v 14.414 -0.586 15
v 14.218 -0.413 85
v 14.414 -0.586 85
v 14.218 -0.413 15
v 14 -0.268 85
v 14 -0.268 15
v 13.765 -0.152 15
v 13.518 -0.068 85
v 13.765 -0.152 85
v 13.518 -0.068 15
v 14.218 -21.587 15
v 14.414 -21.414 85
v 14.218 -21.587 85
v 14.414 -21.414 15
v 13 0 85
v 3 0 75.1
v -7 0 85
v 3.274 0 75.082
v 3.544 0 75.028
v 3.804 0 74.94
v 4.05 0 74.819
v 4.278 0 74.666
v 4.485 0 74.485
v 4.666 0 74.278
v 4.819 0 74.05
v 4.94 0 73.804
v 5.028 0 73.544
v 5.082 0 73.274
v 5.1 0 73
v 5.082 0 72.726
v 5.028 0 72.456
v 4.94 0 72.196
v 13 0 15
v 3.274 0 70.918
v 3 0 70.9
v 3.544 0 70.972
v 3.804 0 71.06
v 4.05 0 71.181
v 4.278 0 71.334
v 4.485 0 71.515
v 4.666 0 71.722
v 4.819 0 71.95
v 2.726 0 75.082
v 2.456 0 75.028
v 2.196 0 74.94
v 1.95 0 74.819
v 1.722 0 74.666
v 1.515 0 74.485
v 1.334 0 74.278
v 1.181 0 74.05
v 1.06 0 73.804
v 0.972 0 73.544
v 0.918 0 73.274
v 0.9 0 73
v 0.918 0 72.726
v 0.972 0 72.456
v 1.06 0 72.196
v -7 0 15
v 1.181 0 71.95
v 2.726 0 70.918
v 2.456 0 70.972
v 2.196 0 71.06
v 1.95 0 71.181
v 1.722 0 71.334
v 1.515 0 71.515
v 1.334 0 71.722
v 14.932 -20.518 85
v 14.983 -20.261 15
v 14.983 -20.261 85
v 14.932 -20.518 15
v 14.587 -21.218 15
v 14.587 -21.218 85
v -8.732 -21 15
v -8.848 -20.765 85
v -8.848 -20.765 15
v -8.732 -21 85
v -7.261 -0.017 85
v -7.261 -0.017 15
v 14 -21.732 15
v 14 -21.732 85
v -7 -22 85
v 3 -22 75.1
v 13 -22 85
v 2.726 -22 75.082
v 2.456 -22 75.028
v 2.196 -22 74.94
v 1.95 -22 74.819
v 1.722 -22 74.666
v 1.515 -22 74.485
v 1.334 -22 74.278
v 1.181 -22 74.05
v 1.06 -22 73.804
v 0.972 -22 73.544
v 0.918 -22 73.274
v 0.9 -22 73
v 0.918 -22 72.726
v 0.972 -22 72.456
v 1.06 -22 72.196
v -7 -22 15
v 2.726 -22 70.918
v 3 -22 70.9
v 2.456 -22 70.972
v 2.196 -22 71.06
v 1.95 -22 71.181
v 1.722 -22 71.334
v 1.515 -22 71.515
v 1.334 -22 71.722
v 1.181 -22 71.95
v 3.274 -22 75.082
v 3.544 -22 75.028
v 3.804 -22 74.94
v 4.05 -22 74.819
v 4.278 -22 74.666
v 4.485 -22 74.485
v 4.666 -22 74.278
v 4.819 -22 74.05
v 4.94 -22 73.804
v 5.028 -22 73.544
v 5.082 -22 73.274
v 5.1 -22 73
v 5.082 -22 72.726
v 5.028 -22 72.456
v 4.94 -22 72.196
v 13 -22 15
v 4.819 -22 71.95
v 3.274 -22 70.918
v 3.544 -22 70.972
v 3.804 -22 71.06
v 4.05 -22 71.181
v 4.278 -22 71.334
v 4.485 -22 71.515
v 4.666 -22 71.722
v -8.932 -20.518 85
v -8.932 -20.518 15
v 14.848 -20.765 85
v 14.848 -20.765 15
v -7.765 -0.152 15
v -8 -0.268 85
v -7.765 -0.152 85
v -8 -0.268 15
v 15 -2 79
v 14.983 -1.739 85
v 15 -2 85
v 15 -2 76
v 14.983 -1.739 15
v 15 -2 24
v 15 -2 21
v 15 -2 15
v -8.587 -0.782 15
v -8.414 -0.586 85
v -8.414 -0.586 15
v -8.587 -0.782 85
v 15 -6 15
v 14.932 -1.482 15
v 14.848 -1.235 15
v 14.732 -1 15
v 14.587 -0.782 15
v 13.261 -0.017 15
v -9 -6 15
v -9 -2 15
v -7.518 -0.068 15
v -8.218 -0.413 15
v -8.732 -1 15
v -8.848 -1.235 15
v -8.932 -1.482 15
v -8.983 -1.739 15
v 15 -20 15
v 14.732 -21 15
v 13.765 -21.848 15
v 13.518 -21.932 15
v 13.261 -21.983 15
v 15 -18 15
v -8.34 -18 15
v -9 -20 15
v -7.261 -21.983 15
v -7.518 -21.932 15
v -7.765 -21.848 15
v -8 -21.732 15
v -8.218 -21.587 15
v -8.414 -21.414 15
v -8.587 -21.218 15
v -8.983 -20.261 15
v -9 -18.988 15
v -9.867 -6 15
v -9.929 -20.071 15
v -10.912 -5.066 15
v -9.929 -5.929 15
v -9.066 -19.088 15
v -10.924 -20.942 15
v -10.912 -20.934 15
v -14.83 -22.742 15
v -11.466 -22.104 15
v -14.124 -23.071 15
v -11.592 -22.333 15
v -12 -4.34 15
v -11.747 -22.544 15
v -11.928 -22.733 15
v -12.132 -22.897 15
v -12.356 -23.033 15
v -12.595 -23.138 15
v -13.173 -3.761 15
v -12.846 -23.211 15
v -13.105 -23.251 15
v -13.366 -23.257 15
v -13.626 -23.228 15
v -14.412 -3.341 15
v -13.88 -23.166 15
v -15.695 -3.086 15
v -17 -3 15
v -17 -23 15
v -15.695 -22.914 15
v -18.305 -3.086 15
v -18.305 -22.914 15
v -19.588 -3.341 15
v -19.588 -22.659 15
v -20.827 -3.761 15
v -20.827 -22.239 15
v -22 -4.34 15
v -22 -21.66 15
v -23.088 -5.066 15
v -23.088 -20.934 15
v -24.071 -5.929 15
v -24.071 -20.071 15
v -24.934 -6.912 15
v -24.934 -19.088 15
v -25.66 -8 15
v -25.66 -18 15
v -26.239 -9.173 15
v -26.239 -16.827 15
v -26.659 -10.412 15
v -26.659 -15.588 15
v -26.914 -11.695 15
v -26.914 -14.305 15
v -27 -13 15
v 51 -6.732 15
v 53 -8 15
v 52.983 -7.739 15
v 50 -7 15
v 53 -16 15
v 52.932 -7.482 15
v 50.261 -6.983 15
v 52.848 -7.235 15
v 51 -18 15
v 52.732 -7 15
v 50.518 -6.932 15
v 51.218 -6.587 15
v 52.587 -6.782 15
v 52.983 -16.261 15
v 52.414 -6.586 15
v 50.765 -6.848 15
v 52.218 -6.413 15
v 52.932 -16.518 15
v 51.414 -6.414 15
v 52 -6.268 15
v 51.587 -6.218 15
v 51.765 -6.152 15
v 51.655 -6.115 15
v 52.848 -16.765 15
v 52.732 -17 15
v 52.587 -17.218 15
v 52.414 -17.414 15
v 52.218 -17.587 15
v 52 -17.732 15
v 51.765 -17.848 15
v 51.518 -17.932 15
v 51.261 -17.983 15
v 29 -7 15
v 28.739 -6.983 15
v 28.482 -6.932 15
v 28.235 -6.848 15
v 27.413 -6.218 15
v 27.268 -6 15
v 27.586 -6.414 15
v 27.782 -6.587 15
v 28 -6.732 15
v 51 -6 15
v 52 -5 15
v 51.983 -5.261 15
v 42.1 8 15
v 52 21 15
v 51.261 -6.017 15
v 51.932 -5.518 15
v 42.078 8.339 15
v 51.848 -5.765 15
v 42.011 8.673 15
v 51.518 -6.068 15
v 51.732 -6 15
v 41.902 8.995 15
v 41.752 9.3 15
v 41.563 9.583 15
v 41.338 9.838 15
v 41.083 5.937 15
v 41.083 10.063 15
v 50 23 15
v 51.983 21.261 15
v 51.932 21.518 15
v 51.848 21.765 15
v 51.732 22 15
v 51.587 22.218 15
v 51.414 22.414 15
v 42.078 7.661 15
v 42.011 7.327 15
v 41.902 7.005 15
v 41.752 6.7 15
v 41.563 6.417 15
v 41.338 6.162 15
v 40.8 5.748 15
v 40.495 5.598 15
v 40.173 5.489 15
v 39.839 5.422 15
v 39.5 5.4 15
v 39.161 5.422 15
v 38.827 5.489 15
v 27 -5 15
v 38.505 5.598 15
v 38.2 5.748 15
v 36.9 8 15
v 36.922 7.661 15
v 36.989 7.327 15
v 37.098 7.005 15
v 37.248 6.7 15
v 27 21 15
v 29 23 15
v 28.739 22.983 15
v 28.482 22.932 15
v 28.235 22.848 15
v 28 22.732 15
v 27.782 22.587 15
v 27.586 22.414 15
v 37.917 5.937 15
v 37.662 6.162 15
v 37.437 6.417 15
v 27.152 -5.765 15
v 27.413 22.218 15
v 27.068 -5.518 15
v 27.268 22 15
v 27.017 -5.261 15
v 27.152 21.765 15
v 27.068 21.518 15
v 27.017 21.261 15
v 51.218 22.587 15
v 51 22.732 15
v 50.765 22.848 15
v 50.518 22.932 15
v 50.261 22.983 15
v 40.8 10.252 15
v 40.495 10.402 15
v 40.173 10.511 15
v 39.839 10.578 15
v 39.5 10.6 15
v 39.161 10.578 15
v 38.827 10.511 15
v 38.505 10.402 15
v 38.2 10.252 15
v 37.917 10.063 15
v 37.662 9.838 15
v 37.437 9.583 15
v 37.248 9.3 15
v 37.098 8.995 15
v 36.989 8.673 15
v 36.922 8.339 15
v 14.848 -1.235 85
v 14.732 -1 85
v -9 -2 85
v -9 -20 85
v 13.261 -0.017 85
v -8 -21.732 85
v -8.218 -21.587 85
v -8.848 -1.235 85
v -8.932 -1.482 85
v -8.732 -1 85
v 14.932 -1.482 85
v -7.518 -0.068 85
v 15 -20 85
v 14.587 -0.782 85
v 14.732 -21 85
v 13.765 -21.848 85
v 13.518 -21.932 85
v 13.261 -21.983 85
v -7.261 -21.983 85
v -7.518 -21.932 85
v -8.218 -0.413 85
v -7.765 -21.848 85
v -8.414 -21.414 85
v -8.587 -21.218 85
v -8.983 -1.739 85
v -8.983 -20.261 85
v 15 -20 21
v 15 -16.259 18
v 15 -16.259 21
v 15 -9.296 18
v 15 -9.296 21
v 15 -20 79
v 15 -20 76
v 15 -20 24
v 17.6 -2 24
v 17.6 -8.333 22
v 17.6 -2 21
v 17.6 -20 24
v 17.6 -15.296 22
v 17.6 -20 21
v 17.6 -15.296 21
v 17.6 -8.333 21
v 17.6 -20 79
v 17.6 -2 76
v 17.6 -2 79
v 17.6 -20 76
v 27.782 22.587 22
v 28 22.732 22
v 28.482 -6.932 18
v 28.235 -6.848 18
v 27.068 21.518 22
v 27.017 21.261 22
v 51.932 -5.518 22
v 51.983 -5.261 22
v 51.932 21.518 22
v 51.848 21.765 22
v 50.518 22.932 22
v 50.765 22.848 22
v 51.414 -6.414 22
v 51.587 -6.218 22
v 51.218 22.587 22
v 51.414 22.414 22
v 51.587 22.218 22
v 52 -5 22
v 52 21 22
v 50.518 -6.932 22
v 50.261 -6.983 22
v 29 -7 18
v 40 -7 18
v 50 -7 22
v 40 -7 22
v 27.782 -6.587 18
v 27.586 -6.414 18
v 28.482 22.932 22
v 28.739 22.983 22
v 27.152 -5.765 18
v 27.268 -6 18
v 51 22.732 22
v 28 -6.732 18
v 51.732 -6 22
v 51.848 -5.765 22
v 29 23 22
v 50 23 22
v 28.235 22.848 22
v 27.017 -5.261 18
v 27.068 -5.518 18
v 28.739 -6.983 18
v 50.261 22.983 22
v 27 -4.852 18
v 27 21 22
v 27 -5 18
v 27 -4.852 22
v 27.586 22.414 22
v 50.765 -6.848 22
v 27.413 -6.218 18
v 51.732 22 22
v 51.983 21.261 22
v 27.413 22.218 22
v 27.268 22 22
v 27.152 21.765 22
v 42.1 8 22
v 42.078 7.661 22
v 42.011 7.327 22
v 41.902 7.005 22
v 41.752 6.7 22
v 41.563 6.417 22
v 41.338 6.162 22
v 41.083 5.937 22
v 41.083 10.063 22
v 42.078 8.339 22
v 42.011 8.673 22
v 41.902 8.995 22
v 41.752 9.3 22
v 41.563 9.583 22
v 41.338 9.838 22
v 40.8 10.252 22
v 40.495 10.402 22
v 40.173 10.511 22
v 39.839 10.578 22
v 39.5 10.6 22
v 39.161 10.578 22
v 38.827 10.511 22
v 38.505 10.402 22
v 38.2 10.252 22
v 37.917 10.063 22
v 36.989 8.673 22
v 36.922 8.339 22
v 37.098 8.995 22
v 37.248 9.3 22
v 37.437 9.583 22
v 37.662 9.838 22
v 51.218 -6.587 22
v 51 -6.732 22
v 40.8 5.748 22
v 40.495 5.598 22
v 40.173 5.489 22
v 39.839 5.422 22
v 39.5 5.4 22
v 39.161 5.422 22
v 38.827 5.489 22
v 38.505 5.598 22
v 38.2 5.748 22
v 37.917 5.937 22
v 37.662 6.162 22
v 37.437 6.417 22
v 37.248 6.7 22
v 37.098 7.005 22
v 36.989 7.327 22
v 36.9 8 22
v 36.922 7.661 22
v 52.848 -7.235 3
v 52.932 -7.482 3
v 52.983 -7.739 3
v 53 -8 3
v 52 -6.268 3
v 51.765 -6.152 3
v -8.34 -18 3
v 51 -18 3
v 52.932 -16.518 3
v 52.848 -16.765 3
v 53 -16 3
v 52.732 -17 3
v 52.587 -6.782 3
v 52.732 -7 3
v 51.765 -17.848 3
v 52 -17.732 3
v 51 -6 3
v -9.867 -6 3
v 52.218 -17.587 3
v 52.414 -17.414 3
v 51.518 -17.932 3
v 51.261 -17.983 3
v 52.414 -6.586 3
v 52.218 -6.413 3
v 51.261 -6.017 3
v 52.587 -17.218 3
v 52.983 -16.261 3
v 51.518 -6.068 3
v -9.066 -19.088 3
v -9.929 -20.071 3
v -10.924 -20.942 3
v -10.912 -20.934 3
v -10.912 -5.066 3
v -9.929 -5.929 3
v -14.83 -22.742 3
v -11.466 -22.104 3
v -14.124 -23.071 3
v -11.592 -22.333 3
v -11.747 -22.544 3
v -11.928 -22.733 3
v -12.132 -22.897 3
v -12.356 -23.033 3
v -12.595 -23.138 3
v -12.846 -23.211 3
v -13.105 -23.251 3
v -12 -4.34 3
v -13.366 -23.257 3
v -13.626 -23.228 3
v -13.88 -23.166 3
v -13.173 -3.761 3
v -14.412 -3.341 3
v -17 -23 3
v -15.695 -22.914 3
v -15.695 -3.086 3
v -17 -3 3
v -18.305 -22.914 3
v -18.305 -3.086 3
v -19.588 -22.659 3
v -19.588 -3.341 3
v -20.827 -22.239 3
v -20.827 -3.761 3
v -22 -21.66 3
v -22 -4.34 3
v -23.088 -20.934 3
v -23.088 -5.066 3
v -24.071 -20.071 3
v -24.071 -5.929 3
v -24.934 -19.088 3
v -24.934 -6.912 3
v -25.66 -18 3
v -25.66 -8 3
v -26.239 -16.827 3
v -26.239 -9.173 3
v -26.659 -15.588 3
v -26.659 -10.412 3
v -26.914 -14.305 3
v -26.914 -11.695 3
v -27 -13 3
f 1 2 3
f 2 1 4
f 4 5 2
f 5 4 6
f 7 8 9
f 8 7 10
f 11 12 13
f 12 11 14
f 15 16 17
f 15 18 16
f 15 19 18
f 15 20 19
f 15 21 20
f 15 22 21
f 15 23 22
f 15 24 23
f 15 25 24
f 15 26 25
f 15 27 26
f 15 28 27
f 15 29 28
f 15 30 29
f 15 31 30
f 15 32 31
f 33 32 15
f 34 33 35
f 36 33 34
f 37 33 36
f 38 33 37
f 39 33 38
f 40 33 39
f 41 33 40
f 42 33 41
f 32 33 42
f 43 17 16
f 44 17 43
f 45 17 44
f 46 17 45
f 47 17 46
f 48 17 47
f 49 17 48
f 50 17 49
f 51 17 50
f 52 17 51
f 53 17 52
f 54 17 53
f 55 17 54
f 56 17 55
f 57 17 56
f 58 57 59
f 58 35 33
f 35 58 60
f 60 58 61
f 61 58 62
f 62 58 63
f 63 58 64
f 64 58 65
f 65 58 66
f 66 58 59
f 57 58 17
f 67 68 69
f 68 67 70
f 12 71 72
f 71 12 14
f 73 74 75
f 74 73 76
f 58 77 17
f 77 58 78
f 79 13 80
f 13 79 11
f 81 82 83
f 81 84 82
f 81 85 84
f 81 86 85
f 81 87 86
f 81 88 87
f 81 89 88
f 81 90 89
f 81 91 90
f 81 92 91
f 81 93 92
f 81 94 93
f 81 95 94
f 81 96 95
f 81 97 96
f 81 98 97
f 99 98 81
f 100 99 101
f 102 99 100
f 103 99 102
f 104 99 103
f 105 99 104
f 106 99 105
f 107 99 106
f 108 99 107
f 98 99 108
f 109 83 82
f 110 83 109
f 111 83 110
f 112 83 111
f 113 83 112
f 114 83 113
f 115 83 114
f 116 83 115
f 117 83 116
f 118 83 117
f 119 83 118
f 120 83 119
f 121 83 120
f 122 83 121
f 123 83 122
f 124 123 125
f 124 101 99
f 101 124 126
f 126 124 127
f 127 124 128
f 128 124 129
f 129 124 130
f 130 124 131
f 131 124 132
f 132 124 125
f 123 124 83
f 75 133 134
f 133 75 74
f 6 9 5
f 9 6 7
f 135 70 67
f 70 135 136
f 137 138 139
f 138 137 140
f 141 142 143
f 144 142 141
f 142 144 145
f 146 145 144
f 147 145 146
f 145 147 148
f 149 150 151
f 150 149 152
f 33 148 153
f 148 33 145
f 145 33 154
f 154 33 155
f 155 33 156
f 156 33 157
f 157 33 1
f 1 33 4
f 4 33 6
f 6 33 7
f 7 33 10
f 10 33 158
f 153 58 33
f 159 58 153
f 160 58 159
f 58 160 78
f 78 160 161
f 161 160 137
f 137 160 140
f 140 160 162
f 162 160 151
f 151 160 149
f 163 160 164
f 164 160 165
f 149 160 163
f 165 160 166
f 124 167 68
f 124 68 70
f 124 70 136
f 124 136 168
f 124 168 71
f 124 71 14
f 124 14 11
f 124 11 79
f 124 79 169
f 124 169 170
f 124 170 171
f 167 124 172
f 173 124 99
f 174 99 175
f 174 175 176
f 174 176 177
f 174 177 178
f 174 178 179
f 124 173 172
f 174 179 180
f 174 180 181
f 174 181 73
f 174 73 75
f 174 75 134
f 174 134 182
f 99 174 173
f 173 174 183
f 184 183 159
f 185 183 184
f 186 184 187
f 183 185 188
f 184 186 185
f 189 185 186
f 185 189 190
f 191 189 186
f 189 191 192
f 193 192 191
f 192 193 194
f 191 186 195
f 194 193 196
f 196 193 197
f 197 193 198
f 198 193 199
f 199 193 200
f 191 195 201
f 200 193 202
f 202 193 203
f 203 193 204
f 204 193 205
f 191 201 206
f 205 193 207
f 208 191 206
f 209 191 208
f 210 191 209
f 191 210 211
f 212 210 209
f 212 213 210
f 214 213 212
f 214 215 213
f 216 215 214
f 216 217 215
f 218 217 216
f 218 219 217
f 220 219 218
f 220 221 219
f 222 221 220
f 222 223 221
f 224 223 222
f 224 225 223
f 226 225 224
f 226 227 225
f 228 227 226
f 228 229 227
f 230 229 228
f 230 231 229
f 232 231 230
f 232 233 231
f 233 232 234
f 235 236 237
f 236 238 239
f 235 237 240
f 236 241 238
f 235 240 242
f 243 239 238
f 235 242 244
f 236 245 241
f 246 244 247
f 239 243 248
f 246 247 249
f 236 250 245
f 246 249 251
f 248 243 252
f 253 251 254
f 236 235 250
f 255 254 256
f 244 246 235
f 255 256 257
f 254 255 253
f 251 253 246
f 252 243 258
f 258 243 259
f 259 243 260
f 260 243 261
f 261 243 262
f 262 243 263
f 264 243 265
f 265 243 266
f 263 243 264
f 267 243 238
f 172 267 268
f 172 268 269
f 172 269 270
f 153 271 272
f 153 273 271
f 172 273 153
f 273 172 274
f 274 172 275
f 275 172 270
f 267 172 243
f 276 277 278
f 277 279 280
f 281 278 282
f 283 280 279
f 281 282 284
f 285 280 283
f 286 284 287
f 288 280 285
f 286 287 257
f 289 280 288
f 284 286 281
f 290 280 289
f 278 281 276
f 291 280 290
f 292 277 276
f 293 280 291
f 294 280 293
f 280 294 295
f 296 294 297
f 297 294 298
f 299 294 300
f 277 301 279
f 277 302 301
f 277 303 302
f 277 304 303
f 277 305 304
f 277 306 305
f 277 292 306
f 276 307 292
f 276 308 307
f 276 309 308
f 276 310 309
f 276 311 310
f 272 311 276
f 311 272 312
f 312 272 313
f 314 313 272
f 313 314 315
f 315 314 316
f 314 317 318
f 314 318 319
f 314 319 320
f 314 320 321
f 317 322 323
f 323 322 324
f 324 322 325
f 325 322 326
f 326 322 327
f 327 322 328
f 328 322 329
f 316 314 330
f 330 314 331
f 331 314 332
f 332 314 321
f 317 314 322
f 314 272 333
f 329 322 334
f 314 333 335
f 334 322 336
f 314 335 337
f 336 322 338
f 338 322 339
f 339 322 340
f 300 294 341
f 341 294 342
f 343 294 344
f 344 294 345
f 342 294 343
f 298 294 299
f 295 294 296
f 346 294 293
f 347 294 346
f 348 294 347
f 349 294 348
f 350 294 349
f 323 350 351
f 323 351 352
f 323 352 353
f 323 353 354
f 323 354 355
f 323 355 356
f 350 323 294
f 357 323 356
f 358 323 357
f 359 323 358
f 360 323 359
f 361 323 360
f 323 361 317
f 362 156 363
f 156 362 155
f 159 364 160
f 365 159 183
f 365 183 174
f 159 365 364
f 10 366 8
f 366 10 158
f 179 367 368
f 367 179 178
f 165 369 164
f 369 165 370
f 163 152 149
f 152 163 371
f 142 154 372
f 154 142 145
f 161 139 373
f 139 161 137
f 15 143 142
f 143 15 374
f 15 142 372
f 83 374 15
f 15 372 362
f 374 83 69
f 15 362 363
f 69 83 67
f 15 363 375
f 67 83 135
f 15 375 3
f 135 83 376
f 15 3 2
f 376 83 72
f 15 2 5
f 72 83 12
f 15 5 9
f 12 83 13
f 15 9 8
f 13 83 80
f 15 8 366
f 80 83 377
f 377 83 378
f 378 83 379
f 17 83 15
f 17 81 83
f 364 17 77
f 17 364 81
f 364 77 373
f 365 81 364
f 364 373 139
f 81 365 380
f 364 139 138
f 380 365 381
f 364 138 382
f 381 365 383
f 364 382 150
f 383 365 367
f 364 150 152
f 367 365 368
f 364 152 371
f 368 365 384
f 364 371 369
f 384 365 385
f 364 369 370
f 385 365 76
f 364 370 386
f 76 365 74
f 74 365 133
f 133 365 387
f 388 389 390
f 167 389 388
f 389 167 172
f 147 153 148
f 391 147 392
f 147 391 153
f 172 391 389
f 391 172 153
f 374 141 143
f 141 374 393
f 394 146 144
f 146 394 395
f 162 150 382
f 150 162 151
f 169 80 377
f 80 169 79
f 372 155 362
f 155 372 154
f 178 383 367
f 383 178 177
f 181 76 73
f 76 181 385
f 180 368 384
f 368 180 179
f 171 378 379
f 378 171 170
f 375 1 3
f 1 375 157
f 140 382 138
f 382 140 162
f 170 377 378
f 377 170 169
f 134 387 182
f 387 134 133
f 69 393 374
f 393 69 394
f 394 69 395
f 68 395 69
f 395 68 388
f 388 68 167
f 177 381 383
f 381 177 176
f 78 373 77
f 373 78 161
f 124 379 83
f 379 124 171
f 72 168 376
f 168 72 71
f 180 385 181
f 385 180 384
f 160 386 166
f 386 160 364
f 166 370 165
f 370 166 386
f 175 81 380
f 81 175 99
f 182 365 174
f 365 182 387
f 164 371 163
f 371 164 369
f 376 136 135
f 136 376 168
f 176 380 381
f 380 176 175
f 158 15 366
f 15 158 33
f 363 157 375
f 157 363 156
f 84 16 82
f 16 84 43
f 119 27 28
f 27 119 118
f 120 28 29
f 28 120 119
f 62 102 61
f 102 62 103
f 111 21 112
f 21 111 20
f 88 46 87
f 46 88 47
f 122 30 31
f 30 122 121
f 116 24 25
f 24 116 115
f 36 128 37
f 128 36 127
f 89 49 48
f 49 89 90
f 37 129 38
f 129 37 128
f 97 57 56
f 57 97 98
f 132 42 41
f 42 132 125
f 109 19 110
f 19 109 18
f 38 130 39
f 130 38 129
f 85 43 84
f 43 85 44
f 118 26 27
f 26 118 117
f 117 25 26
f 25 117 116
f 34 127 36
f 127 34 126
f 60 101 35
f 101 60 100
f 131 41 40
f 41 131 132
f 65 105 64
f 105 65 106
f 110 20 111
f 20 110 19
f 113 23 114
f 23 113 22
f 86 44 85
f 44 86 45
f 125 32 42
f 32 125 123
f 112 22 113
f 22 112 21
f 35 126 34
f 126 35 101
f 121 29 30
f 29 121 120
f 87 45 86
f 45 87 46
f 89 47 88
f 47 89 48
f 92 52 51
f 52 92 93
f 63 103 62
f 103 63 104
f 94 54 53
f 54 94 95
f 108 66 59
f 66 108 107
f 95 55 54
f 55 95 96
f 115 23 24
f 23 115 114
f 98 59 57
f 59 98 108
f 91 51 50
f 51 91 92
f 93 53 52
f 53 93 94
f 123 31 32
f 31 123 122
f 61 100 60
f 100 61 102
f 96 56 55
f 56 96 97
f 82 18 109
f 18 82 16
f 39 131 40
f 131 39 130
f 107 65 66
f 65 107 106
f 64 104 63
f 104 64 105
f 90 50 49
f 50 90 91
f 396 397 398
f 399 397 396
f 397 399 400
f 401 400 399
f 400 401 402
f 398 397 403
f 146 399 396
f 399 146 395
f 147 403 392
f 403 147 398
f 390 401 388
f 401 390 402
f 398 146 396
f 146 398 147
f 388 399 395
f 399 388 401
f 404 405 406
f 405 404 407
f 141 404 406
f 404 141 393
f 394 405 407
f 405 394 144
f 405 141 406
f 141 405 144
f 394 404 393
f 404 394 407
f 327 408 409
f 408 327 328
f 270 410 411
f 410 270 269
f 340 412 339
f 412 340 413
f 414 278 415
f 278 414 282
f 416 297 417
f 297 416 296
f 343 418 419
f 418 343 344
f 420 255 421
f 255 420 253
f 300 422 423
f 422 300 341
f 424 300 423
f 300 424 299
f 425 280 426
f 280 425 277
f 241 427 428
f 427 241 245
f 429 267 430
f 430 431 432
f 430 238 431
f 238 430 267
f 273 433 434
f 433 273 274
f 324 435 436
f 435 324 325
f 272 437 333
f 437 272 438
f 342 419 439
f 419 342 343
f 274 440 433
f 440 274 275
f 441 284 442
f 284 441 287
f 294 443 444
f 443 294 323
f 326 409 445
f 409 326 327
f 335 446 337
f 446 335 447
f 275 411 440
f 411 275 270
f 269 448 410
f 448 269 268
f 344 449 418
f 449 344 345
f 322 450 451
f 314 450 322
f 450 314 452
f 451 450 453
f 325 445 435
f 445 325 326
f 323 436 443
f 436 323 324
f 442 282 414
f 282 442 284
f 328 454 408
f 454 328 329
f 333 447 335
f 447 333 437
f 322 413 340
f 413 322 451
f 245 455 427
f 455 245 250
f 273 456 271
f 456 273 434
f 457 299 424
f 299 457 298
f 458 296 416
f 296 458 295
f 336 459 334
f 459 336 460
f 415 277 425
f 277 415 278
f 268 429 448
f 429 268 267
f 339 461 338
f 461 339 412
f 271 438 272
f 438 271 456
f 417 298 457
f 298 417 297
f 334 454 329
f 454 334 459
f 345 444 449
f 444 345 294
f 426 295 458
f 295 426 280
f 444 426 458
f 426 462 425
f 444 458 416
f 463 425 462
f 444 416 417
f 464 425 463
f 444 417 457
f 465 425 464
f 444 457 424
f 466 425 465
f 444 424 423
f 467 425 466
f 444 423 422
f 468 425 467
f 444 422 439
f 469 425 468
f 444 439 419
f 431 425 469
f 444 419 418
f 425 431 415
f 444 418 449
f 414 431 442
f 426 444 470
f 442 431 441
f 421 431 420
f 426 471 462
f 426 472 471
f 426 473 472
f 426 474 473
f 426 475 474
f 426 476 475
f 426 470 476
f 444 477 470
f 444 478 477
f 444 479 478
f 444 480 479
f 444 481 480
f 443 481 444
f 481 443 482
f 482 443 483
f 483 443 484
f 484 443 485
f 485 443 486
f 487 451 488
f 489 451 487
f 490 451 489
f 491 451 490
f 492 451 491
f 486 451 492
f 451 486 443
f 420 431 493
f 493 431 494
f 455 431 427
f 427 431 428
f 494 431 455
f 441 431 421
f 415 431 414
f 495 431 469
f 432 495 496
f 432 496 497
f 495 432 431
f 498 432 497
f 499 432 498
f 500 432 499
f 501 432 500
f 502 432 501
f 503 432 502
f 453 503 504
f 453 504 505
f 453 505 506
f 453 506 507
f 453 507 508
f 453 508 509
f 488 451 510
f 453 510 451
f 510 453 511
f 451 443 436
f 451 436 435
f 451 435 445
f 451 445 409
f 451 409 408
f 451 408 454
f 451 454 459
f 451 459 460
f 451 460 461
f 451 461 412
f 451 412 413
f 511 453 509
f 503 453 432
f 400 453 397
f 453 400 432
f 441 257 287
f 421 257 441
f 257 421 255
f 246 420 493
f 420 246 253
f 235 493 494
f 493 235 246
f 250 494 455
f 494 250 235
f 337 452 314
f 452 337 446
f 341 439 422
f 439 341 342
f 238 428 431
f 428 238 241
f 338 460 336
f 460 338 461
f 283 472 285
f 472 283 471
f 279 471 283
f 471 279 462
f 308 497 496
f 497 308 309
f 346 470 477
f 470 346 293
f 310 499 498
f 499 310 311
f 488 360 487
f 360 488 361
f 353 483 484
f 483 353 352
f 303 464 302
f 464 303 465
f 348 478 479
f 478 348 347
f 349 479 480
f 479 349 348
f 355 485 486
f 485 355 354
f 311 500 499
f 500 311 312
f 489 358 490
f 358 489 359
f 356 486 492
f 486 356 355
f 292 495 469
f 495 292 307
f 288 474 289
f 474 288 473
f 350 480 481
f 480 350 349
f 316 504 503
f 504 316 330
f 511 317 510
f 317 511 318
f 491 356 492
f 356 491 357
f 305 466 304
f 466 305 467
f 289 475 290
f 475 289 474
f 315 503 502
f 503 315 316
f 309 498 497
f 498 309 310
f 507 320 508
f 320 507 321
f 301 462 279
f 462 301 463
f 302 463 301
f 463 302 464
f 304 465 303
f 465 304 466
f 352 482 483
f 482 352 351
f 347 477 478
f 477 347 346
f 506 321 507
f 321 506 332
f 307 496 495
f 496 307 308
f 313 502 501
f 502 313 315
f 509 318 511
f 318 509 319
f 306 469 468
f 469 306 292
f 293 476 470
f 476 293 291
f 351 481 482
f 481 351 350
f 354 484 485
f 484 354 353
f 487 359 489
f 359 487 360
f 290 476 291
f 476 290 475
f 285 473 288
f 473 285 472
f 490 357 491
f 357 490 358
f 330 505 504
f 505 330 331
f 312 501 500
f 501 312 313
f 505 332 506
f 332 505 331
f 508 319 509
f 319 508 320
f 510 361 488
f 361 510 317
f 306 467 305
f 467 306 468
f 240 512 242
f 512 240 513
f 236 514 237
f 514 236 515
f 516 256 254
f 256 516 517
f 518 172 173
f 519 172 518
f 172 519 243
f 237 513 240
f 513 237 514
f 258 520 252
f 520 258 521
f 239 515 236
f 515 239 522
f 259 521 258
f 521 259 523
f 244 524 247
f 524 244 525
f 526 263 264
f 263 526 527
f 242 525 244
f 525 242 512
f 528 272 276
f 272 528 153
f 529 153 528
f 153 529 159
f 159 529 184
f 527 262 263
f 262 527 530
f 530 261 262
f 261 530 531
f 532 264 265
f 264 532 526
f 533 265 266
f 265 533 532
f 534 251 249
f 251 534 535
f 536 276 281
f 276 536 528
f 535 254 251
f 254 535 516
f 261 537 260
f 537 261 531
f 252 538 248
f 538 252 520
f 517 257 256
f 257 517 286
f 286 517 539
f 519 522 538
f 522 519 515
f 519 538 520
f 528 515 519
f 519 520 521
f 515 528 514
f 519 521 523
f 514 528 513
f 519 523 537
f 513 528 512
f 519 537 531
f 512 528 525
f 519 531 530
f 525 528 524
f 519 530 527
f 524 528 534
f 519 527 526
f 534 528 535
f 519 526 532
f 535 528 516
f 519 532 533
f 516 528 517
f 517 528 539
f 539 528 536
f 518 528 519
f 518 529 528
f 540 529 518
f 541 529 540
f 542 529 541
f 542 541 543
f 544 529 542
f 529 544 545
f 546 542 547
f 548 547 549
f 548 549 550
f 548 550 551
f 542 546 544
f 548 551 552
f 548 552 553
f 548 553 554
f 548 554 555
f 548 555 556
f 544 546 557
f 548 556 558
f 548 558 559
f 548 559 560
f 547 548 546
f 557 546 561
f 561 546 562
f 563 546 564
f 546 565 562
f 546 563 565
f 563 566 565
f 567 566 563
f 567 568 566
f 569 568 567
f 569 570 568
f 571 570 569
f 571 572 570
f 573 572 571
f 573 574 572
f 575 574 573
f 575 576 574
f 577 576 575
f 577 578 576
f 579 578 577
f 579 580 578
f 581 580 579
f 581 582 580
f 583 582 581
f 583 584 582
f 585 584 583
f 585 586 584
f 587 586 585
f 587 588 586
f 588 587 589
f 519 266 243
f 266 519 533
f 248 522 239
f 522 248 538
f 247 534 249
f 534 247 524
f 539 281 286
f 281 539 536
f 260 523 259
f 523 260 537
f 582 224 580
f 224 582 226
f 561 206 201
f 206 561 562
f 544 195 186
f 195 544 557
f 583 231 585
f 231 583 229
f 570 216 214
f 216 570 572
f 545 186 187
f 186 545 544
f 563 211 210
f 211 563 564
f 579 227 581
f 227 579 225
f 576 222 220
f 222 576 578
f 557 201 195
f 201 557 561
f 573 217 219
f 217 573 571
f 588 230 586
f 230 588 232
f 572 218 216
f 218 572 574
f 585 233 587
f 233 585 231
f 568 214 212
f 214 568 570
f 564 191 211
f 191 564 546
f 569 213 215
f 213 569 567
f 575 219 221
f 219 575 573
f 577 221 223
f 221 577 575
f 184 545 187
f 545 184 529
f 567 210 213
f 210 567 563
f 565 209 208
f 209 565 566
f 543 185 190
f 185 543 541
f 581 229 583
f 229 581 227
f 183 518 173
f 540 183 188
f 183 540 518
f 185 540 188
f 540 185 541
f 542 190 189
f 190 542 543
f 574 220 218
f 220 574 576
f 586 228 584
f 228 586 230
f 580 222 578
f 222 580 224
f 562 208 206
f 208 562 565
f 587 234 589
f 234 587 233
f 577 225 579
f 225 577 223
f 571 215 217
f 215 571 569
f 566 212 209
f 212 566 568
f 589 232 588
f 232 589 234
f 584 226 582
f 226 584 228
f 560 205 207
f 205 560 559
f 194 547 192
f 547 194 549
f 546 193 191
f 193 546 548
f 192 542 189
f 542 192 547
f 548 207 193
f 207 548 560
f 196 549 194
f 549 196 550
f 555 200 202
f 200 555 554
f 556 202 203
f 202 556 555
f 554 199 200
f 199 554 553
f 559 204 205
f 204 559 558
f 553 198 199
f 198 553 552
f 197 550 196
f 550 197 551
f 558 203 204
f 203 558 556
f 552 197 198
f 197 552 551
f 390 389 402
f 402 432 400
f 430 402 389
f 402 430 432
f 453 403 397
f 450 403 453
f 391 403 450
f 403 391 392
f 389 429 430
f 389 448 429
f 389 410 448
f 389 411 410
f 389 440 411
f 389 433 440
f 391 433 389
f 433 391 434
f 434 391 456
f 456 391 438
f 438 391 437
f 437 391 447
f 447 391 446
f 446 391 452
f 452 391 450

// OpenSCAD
// Support_Cam_PI_IR_Cut_CR6_v2.scad
// Parametric CR-6 Pi IR-cut camera support brackets.
//
// v2 intentionally does not import or reuse the STL meshes.  The original STL
// files were only measured to set the default dimensions and to validate the
// generated bounding boxes.  Choose Left, Right, or Both in OpenSCAD Customizer.

/* [Bracket Selection] */
bracket = "Right"; // [Right, Left, Both]

/* [General Dimensions] */
base_height = 12;
base_thickness_z = 12;
arm_width = 14;
plate_thickness = 7;
tower_height = 70;
tower_width = 24;
tower_depth = 22;
rib_thickness = 3;
corner_radius = 2;
$fn = 48;

/* [Mounting Holes] */
camera_hole_diameter = 5.2;
tower_hole_diameter = 4.2;
hole_clearance_z = 0.2;

/* [Preview] */
both_spacing = 18; // [0:1:100]
preview_colors = true;

module maybe_color(name) {
    if (preview_colors && name == "Right") color("lightsteelblue") children();
    else if (preview_colors && name == "Left") color("palegreen") children();
    else children();
}

module rounded_box(size, radius = 1) {
    hull() {
        for (x = [radius, size[0] - radius])
            for (y = [radius, size[1] - radius])
                translate([x, y, 0]) cylinder(h = size[2], r = radius);
    }
}

module bar_between(a, b, width, height) {
    hull() {
        translate([a[0], a[1], 0]) cylinder(h = height, d = width);
        translate([b[0], b[1], 0]) cylinder(h = height, d = width);
    }
}

module vertical_tower(pos, size, hole_y, hole_z) {
    difference() {
        translate(pos) rounded_box(size, corner_radius);
        translate([pos[0] + size[0] / 2, hole_y, hole_z])
            rotate([90, 0, 0])
                cylinder(h = size[1] + 2, d = tower_hole_diameter, center = true);
    }

    // Small cap ribs on the outside face keep this parametric and printable without STL mesh reuse.
    translate([pos[0] + size[0] - 0.4, pos[1] + 2, pos[2] + 6])
        cube([rib_thickness, size[1] - 4, 3]);
    translate([pos[0] + size[0] - 0.4, pos[1] + 2, pos[2] + size[2] - 9])
        cube([rib_thickness, size[1] - 4, 3]);
}

module camera_plate(pos, size, hole_xy) {
    difference() {
        translate(pos) rounded_box(size, corner_radius);
        translate([hole_xy[0], hole_xy[1], pos[2] - hole_clearance_z])
            cylinder(h = size[2] + hole_clearance_z * 2, d = camera_hole_diameter);
    }
}

module right_bracket_raw() {
    difference() {
        union() {
            // Long lower arm and the rounded clamp lobe visible on the right STL.
            translate([-22, -18, 3]) rounded_box([75, 12, base_thickness_z], corner_radius);
            translate([-17, -13, 3]) cylinder(h = base_thickness_z, d = 20);
            translate([-25, -18, 3]) rotate([0, 0, -25]) rounded_box([14, 10, base_thickness_z], corner_radius);

            // Upright printer-side tower.
            vertical_tower([-9, -22, 15], [24, tower_depth, tower_height], -11, 73);

            // Camera mounting tab.
            camera_plate([27, -7, 15], [25, 30, plate_thickness], [39.5, 8]);

            // Low upper brace between tower and camera tab.
            hull() {
                translate([5, -17, 18]) cube([8, 4, 4]);
                translate([32, -7, 18]) cube([8, 4, 4]);
            }
        }
    }
}

module left_bracket_raw() {
    union() {
        // Diagonal arm and horizontal camera tab measured from the left STL top view.
        translate([0, 0, 0]) bar_between([-8, 8], [30, 43], arm_width, base_thickness_z);
        translate([24, 41, 0]) rounded_box([58, 15, base_thickness_z], corner_radius);

        // Printer-side tower and end block.
        vertical_tower([-17, 2, 12], [24, tower_depth, tower_height], 13, 73);
        translate([-11, 3, 0]) rotate([0, 0, 45]) rounded_box([12, 12, base_thickness_z], corner_radius);

        // Camera hole in the horizontal tab.
        difference() {
            translate([50, 42, 0]) rounded_box([31, 18, plate_thickness], corner_radius);
            translate([64, 51, -hole_clearance_z])
                cylinder(h = plate_thickness + hole_clearance_z * 2, d = camera_hole_diameter);
        }
    }
}

module right_bracket() { maybe_color("Right") right_bracket_raw(); }
module left_bracket() { maybe_color("Left") left_bracket_raw(); }

module selected_bracket() {
    if (bracket == "Right") right_bracket();
    else if (bracket == "Left") left_bracket();
    else if (bracket == "Both") {
        translate([-60 - both_spacing / 2, 0, 0]) right_bracket();
        translate([35 + both_spacing / 2, 0, 0]) left_bracket();
    } else echo(str("Unknown bracket option: ", bracket));
}

selected_bracket();
